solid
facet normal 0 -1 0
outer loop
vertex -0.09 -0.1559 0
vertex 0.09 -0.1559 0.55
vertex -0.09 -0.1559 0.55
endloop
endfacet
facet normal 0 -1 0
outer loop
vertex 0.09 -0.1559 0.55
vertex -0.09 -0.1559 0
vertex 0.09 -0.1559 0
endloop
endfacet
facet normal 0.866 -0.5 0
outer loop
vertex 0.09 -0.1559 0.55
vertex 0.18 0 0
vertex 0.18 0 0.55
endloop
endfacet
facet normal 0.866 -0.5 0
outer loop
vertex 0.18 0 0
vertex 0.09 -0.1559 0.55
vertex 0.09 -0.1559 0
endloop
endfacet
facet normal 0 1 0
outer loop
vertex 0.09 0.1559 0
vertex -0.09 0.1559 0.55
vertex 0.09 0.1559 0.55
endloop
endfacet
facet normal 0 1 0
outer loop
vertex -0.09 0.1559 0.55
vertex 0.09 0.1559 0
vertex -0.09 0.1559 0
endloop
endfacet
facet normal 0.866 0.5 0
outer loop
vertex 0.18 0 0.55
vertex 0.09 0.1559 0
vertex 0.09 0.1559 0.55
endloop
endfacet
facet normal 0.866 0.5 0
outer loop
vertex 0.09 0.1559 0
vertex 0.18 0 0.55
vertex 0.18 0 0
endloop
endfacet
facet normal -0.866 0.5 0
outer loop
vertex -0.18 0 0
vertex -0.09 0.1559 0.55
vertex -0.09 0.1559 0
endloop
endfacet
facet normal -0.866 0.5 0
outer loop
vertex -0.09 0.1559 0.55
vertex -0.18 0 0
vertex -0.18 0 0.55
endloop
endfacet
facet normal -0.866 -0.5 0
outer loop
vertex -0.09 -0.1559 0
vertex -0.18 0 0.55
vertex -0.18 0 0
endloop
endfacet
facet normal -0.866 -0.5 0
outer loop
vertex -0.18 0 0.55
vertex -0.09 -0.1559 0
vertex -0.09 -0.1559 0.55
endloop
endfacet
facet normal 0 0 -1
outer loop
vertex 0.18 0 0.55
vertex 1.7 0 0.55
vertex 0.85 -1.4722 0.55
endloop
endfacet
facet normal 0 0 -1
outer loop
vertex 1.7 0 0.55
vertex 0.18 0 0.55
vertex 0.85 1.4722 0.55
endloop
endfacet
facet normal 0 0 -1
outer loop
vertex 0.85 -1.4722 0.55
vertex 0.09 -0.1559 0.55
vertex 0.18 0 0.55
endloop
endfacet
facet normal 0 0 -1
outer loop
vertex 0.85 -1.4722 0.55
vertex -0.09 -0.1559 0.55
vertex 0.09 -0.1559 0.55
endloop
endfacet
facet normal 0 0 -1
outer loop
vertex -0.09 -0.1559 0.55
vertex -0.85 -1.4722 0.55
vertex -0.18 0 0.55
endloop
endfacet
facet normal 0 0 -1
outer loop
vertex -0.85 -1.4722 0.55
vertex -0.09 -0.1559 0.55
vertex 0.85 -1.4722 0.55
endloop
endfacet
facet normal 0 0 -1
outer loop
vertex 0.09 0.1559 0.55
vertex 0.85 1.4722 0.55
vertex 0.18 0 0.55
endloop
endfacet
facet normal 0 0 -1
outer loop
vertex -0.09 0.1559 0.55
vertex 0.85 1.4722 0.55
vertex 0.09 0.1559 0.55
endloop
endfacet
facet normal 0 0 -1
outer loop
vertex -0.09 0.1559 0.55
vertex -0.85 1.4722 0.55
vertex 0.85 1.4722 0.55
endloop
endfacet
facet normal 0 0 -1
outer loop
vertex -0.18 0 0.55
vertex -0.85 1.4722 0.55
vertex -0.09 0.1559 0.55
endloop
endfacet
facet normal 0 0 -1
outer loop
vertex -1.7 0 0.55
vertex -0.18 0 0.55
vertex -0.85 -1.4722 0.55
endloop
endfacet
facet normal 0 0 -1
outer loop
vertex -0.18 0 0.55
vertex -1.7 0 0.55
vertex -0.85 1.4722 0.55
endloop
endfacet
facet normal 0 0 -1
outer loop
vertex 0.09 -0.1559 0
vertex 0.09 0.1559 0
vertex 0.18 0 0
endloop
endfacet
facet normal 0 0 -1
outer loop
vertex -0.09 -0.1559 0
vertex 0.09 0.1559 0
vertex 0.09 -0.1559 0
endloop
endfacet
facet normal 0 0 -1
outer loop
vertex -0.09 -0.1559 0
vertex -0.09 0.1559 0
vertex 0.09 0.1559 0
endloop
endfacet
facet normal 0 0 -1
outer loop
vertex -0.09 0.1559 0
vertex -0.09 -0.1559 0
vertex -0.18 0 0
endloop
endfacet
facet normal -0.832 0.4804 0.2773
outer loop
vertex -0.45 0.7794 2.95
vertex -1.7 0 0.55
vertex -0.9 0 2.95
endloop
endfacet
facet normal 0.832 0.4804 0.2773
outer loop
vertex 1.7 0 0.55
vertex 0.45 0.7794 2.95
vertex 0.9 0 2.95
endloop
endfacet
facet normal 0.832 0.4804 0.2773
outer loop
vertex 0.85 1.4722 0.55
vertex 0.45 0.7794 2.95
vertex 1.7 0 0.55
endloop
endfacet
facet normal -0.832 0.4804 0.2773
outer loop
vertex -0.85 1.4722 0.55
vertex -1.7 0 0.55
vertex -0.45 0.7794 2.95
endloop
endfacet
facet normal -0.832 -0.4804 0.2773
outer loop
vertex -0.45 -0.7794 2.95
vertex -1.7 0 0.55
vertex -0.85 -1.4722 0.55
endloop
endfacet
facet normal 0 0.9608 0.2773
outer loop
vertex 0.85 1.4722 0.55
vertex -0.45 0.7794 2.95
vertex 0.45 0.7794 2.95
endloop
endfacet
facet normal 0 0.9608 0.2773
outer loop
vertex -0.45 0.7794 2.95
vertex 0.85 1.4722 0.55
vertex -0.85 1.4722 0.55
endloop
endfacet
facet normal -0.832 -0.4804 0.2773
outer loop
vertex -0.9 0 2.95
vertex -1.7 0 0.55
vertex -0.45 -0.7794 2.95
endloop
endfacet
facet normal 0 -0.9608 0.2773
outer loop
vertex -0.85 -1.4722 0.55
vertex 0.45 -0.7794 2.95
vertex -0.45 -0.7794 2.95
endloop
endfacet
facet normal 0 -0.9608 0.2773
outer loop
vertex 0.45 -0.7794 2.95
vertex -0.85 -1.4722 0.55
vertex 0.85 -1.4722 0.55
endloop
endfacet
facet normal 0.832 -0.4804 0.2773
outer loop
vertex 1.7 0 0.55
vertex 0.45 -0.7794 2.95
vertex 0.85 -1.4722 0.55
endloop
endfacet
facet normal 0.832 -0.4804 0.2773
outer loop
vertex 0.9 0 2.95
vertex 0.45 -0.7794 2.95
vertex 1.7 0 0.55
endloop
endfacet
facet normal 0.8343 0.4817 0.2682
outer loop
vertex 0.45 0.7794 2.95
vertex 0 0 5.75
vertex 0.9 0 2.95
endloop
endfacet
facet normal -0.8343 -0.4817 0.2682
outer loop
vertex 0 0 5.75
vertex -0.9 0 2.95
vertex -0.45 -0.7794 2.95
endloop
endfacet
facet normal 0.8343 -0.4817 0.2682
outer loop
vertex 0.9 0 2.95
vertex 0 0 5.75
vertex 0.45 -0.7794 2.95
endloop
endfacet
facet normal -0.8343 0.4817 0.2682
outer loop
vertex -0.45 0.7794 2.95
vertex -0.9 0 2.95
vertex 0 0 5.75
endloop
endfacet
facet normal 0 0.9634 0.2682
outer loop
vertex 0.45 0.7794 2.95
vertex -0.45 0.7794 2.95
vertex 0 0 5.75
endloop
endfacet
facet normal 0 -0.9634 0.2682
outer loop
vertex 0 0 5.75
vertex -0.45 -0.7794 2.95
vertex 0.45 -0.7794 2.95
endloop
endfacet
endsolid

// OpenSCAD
// Conifer variant 2 — christmas-tree double cone. Lower truncated frustum
// stacked under an upper full cone; gives the forest one obviously-
// different silhouette so dense stands don't look like a single repeated
// stamp.
// Conventions, units, and axis docs: see models-src/README.md.

$fn = 6;

trunk_r       = 0.18;
trunk_h       = 0.55;
lower_r       = 1.70;
lower_top_r   = 0.90;
lower_h       = 2.40;
upper_r       = 0.90;
upper_h       = 2.80;

module tree3() {
    color("SaddleBrown")
        cylinder(h = trunk_h, r = trunk_r);
    // Lower frustum (the broad skirt).
    color("DarkGreen")
        translate([0, 0, trunk_h])
            cylinder(h = lower_h, r1 = lower_r, r2 = lower_top_r);
    // Upper apex cone, perched on the frustum's top ring.
    color("DarkGreen")
        translate([0, 0, trunk_h + lower_h])
            cylinder(h = upper_h, r1 = upper_r, r2 = 0);
}

tree3();
